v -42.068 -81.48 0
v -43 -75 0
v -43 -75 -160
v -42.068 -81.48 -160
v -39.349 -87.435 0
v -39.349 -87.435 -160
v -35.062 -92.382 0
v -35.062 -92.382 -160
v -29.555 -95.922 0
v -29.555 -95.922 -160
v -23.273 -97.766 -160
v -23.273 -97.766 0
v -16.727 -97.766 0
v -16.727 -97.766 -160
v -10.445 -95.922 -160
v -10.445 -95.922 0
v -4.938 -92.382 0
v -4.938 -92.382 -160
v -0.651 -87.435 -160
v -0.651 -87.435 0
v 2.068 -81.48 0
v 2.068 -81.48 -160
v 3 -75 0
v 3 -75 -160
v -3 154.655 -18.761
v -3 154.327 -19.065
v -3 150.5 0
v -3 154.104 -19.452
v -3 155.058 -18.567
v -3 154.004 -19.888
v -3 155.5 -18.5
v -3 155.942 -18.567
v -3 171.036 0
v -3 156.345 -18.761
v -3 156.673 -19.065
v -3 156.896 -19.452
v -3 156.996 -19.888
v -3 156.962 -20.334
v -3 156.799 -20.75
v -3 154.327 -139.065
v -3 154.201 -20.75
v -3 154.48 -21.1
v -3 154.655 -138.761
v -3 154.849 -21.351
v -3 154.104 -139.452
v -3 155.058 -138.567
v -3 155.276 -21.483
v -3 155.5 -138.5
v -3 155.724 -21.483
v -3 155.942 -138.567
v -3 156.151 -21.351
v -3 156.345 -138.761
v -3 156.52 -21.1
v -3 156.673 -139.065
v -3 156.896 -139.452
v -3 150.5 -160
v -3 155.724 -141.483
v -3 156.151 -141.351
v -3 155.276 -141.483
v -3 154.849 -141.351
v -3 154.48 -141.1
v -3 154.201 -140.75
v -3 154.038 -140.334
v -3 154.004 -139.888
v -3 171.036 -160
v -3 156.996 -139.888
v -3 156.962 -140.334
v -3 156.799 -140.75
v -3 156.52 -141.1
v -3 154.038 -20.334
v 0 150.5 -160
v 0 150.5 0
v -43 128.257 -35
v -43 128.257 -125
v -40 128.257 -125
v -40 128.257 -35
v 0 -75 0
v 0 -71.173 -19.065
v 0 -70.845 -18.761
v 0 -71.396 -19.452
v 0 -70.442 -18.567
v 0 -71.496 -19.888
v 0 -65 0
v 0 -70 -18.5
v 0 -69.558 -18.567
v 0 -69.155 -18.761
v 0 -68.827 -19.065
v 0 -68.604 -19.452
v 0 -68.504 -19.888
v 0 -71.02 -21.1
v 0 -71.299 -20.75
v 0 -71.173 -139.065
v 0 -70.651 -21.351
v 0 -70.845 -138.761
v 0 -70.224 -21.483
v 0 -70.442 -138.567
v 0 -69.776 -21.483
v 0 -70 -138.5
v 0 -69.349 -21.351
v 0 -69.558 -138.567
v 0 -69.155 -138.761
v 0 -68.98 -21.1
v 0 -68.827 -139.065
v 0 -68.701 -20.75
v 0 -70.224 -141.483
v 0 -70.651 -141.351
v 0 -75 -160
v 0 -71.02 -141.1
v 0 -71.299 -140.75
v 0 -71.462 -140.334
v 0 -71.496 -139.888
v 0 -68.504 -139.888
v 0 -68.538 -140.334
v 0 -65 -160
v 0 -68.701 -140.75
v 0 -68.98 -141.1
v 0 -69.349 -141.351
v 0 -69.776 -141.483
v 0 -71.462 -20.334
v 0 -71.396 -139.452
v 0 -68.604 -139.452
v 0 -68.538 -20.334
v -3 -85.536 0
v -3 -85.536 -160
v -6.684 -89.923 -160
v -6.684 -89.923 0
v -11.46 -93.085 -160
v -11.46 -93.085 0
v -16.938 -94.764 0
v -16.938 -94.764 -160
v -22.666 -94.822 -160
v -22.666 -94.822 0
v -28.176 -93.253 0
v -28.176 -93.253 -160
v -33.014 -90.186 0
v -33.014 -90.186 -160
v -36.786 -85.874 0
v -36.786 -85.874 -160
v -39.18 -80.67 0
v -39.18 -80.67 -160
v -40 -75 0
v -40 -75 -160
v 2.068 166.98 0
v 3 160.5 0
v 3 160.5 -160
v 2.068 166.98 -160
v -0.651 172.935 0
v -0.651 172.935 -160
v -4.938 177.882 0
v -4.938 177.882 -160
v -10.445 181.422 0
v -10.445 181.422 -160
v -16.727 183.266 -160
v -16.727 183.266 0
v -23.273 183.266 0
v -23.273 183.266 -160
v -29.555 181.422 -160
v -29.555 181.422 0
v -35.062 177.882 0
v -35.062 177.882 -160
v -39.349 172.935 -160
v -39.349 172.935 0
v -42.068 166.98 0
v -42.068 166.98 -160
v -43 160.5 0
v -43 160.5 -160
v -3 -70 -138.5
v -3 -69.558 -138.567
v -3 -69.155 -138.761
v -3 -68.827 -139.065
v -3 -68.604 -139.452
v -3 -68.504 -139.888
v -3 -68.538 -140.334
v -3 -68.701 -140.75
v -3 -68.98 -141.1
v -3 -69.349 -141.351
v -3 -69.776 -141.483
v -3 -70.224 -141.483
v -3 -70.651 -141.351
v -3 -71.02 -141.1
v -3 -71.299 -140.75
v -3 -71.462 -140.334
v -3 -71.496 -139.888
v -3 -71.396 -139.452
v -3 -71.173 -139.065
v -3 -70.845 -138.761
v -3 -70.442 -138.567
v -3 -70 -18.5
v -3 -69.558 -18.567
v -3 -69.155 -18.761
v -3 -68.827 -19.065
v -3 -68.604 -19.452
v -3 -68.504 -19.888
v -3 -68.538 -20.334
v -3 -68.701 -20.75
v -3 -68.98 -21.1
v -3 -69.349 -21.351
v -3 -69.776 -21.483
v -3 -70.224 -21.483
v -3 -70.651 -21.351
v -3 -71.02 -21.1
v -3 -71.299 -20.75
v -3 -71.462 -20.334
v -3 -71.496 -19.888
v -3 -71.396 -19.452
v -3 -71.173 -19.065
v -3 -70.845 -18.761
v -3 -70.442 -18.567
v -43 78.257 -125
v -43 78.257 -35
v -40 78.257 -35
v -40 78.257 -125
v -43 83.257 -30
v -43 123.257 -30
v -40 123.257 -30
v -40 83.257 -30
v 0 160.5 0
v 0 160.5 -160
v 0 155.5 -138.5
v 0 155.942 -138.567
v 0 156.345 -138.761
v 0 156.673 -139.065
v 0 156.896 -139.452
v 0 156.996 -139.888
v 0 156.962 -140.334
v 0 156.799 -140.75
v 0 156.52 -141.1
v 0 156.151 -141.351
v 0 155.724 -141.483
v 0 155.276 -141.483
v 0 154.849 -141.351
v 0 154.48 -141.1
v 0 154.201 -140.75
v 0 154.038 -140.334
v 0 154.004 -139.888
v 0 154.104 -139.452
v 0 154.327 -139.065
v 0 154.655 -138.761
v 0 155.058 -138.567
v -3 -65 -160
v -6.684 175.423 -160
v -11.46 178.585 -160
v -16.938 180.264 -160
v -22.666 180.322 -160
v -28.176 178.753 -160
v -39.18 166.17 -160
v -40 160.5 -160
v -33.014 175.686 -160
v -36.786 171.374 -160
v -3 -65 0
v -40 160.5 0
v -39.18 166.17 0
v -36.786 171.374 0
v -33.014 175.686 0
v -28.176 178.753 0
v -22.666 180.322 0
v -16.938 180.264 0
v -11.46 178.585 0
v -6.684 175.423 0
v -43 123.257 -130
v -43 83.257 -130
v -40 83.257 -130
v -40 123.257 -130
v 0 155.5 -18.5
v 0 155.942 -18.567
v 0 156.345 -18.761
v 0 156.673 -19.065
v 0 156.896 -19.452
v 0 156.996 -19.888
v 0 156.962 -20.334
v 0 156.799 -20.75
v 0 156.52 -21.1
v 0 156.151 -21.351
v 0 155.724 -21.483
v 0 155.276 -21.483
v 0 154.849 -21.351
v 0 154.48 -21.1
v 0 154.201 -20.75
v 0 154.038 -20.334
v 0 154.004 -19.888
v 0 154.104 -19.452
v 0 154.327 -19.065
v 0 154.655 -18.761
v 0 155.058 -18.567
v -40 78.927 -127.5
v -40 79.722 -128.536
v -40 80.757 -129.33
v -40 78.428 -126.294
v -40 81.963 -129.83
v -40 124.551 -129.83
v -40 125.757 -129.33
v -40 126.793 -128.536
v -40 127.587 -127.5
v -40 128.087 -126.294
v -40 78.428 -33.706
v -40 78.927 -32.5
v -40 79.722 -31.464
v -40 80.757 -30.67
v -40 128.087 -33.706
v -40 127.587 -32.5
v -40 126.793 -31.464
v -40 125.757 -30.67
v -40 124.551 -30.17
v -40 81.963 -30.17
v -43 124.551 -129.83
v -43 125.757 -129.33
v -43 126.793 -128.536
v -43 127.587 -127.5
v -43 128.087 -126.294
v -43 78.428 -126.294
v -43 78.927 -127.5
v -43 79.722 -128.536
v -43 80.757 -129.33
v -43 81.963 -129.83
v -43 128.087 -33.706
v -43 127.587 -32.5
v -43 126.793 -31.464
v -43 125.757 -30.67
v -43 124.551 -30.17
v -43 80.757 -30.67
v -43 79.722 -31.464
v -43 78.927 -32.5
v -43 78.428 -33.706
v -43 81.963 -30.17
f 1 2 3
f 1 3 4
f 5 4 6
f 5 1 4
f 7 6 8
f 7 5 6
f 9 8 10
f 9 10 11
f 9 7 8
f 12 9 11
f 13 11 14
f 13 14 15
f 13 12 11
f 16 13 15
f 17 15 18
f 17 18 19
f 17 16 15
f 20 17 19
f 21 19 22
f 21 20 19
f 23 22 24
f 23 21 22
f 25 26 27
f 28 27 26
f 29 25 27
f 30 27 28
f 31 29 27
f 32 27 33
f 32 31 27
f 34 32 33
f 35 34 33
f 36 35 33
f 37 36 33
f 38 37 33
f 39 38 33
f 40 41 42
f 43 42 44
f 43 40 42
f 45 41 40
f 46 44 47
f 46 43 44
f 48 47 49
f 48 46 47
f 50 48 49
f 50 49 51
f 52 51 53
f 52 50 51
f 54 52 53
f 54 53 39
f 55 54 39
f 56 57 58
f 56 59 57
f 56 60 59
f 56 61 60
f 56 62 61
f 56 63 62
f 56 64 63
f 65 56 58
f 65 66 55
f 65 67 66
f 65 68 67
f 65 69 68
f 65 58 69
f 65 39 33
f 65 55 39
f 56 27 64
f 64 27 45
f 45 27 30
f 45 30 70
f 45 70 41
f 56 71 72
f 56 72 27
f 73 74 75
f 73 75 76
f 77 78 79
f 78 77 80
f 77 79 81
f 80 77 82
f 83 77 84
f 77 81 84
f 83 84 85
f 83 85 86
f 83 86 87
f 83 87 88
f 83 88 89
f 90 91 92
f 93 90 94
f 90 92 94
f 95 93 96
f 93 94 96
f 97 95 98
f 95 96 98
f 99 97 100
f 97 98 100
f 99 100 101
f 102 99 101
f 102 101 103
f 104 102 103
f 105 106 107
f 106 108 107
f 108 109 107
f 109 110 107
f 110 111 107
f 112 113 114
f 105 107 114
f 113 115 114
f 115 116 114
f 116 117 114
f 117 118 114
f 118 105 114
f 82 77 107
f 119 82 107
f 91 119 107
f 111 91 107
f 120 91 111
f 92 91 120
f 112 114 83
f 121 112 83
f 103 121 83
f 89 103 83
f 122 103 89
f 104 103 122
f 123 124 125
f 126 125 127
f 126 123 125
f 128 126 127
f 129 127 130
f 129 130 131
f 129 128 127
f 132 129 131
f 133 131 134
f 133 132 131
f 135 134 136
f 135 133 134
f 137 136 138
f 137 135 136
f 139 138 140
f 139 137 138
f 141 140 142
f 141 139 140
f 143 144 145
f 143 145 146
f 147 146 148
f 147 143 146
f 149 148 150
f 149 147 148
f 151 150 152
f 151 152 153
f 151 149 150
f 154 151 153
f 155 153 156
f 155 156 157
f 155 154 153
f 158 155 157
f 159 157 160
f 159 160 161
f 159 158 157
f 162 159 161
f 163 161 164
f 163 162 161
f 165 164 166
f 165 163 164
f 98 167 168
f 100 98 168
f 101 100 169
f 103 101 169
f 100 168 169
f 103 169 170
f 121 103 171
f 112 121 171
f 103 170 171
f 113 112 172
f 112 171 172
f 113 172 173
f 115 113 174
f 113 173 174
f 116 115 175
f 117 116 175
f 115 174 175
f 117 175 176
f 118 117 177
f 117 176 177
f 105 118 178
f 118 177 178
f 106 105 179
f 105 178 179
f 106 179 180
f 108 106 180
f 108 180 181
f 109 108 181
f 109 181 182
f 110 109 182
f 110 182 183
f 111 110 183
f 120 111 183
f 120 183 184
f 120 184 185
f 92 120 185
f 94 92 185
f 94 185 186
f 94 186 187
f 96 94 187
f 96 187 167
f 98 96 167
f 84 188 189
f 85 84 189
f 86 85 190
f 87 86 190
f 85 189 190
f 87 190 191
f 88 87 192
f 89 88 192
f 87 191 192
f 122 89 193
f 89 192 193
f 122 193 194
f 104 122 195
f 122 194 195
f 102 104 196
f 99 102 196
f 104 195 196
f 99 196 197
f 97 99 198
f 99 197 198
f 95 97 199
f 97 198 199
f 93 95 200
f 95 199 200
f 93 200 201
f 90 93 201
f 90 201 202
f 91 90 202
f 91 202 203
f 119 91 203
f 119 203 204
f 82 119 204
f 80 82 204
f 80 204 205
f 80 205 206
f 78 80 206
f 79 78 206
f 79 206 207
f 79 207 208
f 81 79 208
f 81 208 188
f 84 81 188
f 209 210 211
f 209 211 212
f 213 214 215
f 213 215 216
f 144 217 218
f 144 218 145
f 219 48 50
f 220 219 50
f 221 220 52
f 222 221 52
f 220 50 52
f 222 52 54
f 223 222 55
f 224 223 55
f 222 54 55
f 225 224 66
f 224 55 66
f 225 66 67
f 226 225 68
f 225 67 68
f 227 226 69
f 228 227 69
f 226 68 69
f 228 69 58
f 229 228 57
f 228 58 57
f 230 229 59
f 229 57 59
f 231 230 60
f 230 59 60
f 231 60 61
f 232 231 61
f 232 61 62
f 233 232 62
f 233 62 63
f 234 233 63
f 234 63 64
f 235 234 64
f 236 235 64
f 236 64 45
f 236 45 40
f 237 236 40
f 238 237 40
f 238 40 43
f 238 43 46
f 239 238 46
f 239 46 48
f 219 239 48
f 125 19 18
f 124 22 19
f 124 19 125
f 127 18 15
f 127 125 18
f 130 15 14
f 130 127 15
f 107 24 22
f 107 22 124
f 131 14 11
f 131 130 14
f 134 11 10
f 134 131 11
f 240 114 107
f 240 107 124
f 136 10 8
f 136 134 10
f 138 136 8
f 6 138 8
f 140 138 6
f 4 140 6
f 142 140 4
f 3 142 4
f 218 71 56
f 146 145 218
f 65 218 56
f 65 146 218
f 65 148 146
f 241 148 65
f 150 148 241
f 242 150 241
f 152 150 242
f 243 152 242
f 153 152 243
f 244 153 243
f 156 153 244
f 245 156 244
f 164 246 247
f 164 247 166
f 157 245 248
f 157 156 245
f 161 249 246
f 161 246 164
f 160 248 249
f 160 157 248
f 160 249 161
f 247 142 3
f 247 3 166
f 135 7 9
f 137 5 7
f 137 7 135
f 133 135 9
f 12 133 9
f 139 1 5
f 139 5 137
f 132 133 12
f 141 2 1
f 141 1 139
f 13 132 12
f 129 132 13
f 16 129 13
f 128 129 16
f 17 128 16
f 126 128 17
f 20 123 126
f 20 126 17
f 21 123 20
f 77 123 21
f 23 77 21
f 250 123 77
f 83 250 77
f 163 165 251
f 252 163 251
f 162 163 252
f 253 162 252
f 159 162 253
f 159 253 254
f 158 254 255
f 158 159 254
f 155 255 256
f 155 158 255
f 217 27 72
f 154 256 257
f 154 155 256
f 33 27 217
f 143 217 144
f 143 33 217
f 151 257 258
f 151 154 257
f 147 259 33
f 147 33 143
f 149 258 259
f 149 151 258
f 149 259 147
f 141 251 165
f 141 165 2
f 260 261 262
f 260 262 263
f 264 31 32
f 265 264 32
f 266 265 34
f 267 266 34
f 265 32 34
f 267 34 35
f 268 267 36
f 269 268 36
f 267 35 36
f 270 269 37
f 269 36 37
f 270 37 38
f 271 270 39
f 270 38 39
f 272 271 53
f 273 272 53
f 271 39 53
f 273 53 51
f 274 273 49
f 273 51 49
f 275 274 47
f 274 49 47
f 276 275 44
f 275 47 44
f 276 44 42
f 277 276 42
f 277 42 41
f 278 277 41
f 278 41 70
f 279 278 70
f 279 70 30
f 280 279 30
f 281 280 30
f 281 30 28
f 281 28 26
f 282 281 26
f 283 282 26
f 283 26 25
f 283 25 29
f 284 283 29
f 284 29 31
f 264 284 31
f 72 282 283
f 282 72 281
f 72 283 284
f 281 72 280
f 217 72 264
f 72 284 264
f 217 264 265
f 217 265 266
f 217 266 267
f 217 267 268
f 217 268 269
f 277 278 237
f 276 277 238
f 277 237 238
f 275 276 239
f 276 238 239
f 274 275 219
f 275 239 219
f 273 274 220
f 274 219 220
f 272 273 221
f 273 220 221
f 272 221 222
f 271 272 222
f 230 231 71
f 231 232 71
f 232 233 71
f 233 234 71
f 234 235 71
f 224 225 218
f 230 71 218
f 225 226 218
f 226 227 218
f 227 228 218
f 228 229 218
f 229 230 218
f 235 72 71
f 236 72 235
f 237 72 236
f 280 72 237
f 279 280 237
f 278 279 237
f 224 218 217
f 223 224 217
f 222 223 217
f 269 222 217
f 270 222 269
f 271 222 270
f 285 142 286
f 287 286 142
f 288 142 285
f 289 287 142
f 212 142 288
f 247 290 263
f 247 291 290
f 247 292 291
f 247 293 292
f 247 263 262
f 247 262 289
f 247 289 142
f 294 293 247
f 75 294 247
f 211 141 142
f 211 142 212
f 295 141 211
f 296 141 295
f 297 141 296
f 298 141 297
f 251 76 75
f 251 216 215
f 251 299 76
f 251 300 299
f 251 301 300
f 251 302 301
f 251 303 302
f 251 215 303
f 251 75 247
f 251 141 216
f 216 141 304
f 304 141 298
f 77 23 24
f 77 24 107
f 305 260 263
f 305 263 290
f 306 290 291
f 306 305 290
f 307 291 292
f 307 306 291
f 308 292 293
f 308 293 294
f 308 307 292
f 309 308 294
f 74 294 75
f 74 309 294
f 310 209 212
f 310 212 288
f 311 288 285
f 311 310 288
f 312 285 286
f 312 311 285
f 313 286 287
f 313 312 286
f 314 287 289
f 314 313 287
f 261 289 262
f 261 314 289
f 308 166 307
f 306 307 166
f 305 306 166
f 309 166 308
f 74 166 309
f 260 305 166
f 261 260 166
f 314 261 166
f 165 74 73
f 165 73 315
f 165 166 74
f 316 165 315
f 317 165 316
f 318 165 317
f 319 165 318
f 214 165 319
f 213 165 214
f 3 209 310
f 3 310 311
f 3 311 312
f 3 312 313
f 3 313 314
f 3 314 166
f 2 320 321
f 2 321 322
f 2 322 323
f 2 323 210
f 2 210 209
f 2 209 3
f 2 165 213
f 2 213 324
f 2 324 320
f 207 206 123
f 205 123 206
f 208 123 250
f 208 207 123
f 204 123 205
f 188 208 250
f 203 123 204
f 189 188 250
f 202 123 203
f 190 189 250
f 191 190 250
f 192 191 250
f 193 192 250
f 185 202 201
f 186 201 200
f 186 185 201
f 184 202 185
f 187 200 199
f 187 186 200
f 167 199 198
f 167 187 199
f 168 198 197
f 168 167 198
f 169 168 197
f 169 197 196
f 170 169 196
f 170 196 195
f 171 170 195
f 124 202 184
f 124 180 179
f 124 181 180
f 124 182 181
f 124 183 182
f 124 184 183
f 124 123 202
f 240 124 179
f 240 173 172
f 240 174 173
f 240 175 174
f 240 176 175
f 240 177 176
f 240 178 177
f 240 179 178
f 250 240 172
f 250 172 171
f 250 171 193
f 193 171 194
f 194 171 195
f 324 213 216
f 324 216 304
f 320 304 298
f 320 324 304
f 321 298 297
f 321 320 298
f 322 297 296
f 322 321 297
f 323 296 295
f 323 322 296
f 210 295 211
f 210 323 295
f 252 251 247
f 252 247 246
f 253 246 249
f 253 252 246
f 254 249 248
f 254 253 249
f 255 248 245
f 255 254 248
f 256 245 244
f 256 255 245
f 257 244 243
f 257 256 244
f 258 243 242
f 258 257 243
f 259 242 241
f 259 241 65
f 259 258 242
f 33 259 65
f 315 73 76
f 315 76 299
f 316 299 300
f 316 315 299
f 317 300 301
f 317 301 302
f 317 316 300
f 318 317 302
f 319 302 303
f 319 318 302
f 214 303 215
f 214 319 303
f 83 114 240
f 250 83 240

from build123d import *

# Parameters (mm, degrees)
BOSS_EXTRUDE1_DEPTH = 160
SKETCH5_W           = 3
SKETCH5_H           = 21.357816692
BOSS_EXTRUDE4_DEPTH = 160
SKETCH7_R           = 1.5
CUT_EXTRUDE2_DEPTH  = 7
CUT_EXTRUDE3_DEPTH  = 3


with BuildPart() as part:
    # Sketch1 → Boss-Extrude1 (new body)
    with BuildSketch(Plane.XY):
        with BuildLine():
            Line((-40, -75), (-40, 160.5))
            ThreePointArc((-40, 160.5), (-20, 180.5), (0, 160.5))
            Line((0, 160.5), (3, 160.5))
            ThreePointArc((3, 160.5), (-20, 183.5), (-43, 160.5))
            Line((-43, 160.5), (-43, -75))
            ThreePointArc((-43, -75), (-20, -98), (3, -75))
            Line((3, -75), (0, -75))
            ThreePointArc((0, -75), (-20, -95), (-40, -75))
        make_face()
    extrude(amount=-BOSS_EXTRUDE1_DEPTH)

    # Sketch5 → Boss-Extrude4 (add)
    with BuildSketch(Plane(origin=(0, 0, -160), x_dir=(-1, 0, 0), z_dir=(0, 0, -1))):
        with Locations((1.5, -75.678908346)):
            Rectangle(SKETCH5_W, SKETCH5_H)
        with Locations((1.5, 161.178908346)):
            Rectangle(SKETCH5_W, SKETCH5_H)
    extrude(amount=-BOSS_EXTRUDE4_DEPTH)

    # Sketch7 → Cut-Extrude2 (cut, through all)
    with BuildSketch(Plane.ZY.offset(3)):
        with Locations((-140, -70)):
            Circle(SKETCH7_R)
        with Locations((-20, -70)):
            Circle(SKETCH7_R)
        with Locations((-20, 155.5)):
            Circle(SKETCH7_R)
        with Locations((-140, 155.5)):
            Circle(SKETCH7_R)
    extrude(amount=-CUT_EXTRUDE2_DEPTH, mode=Mode.SUBTRACT)

    # Sketch8 → Cut-Extrude3 (cut)
    with BuildSketch(Plane.ZY.offset(43)):
        with BuildLine():
            Line((-125, 128.257283518), (-35, 128.257283518))
            ThreePointArc((-35, 128.257283518), (-31.464466094, 126.792817424), (-30, 123.257283518))
            Line((-30, 123.257283518), (-30, 83.257283518))
            ThreePointArc((-30, 83.257283518), (-31.464466094, 79.721749612), (-35, 78.257283518))
            Line((-35, 78.257283518), (-125, 78.257283518))
            ThreePointArc((-125, 78.257283518), (-128.535533906, 79.721749612), (-130, 83.257283518))
            Line((-130, 83.257283518), (-130, 123.257283518))
            ThreePointArc((-130, 123.257283518), (-128.535533906, 126.792817424), (-125, 128.257283518))
        make_face()
    extrude(amount=-CUT_EXTRUDE3_DEPTH, mode=Mode.SUBTRACT)


solid = part.part
